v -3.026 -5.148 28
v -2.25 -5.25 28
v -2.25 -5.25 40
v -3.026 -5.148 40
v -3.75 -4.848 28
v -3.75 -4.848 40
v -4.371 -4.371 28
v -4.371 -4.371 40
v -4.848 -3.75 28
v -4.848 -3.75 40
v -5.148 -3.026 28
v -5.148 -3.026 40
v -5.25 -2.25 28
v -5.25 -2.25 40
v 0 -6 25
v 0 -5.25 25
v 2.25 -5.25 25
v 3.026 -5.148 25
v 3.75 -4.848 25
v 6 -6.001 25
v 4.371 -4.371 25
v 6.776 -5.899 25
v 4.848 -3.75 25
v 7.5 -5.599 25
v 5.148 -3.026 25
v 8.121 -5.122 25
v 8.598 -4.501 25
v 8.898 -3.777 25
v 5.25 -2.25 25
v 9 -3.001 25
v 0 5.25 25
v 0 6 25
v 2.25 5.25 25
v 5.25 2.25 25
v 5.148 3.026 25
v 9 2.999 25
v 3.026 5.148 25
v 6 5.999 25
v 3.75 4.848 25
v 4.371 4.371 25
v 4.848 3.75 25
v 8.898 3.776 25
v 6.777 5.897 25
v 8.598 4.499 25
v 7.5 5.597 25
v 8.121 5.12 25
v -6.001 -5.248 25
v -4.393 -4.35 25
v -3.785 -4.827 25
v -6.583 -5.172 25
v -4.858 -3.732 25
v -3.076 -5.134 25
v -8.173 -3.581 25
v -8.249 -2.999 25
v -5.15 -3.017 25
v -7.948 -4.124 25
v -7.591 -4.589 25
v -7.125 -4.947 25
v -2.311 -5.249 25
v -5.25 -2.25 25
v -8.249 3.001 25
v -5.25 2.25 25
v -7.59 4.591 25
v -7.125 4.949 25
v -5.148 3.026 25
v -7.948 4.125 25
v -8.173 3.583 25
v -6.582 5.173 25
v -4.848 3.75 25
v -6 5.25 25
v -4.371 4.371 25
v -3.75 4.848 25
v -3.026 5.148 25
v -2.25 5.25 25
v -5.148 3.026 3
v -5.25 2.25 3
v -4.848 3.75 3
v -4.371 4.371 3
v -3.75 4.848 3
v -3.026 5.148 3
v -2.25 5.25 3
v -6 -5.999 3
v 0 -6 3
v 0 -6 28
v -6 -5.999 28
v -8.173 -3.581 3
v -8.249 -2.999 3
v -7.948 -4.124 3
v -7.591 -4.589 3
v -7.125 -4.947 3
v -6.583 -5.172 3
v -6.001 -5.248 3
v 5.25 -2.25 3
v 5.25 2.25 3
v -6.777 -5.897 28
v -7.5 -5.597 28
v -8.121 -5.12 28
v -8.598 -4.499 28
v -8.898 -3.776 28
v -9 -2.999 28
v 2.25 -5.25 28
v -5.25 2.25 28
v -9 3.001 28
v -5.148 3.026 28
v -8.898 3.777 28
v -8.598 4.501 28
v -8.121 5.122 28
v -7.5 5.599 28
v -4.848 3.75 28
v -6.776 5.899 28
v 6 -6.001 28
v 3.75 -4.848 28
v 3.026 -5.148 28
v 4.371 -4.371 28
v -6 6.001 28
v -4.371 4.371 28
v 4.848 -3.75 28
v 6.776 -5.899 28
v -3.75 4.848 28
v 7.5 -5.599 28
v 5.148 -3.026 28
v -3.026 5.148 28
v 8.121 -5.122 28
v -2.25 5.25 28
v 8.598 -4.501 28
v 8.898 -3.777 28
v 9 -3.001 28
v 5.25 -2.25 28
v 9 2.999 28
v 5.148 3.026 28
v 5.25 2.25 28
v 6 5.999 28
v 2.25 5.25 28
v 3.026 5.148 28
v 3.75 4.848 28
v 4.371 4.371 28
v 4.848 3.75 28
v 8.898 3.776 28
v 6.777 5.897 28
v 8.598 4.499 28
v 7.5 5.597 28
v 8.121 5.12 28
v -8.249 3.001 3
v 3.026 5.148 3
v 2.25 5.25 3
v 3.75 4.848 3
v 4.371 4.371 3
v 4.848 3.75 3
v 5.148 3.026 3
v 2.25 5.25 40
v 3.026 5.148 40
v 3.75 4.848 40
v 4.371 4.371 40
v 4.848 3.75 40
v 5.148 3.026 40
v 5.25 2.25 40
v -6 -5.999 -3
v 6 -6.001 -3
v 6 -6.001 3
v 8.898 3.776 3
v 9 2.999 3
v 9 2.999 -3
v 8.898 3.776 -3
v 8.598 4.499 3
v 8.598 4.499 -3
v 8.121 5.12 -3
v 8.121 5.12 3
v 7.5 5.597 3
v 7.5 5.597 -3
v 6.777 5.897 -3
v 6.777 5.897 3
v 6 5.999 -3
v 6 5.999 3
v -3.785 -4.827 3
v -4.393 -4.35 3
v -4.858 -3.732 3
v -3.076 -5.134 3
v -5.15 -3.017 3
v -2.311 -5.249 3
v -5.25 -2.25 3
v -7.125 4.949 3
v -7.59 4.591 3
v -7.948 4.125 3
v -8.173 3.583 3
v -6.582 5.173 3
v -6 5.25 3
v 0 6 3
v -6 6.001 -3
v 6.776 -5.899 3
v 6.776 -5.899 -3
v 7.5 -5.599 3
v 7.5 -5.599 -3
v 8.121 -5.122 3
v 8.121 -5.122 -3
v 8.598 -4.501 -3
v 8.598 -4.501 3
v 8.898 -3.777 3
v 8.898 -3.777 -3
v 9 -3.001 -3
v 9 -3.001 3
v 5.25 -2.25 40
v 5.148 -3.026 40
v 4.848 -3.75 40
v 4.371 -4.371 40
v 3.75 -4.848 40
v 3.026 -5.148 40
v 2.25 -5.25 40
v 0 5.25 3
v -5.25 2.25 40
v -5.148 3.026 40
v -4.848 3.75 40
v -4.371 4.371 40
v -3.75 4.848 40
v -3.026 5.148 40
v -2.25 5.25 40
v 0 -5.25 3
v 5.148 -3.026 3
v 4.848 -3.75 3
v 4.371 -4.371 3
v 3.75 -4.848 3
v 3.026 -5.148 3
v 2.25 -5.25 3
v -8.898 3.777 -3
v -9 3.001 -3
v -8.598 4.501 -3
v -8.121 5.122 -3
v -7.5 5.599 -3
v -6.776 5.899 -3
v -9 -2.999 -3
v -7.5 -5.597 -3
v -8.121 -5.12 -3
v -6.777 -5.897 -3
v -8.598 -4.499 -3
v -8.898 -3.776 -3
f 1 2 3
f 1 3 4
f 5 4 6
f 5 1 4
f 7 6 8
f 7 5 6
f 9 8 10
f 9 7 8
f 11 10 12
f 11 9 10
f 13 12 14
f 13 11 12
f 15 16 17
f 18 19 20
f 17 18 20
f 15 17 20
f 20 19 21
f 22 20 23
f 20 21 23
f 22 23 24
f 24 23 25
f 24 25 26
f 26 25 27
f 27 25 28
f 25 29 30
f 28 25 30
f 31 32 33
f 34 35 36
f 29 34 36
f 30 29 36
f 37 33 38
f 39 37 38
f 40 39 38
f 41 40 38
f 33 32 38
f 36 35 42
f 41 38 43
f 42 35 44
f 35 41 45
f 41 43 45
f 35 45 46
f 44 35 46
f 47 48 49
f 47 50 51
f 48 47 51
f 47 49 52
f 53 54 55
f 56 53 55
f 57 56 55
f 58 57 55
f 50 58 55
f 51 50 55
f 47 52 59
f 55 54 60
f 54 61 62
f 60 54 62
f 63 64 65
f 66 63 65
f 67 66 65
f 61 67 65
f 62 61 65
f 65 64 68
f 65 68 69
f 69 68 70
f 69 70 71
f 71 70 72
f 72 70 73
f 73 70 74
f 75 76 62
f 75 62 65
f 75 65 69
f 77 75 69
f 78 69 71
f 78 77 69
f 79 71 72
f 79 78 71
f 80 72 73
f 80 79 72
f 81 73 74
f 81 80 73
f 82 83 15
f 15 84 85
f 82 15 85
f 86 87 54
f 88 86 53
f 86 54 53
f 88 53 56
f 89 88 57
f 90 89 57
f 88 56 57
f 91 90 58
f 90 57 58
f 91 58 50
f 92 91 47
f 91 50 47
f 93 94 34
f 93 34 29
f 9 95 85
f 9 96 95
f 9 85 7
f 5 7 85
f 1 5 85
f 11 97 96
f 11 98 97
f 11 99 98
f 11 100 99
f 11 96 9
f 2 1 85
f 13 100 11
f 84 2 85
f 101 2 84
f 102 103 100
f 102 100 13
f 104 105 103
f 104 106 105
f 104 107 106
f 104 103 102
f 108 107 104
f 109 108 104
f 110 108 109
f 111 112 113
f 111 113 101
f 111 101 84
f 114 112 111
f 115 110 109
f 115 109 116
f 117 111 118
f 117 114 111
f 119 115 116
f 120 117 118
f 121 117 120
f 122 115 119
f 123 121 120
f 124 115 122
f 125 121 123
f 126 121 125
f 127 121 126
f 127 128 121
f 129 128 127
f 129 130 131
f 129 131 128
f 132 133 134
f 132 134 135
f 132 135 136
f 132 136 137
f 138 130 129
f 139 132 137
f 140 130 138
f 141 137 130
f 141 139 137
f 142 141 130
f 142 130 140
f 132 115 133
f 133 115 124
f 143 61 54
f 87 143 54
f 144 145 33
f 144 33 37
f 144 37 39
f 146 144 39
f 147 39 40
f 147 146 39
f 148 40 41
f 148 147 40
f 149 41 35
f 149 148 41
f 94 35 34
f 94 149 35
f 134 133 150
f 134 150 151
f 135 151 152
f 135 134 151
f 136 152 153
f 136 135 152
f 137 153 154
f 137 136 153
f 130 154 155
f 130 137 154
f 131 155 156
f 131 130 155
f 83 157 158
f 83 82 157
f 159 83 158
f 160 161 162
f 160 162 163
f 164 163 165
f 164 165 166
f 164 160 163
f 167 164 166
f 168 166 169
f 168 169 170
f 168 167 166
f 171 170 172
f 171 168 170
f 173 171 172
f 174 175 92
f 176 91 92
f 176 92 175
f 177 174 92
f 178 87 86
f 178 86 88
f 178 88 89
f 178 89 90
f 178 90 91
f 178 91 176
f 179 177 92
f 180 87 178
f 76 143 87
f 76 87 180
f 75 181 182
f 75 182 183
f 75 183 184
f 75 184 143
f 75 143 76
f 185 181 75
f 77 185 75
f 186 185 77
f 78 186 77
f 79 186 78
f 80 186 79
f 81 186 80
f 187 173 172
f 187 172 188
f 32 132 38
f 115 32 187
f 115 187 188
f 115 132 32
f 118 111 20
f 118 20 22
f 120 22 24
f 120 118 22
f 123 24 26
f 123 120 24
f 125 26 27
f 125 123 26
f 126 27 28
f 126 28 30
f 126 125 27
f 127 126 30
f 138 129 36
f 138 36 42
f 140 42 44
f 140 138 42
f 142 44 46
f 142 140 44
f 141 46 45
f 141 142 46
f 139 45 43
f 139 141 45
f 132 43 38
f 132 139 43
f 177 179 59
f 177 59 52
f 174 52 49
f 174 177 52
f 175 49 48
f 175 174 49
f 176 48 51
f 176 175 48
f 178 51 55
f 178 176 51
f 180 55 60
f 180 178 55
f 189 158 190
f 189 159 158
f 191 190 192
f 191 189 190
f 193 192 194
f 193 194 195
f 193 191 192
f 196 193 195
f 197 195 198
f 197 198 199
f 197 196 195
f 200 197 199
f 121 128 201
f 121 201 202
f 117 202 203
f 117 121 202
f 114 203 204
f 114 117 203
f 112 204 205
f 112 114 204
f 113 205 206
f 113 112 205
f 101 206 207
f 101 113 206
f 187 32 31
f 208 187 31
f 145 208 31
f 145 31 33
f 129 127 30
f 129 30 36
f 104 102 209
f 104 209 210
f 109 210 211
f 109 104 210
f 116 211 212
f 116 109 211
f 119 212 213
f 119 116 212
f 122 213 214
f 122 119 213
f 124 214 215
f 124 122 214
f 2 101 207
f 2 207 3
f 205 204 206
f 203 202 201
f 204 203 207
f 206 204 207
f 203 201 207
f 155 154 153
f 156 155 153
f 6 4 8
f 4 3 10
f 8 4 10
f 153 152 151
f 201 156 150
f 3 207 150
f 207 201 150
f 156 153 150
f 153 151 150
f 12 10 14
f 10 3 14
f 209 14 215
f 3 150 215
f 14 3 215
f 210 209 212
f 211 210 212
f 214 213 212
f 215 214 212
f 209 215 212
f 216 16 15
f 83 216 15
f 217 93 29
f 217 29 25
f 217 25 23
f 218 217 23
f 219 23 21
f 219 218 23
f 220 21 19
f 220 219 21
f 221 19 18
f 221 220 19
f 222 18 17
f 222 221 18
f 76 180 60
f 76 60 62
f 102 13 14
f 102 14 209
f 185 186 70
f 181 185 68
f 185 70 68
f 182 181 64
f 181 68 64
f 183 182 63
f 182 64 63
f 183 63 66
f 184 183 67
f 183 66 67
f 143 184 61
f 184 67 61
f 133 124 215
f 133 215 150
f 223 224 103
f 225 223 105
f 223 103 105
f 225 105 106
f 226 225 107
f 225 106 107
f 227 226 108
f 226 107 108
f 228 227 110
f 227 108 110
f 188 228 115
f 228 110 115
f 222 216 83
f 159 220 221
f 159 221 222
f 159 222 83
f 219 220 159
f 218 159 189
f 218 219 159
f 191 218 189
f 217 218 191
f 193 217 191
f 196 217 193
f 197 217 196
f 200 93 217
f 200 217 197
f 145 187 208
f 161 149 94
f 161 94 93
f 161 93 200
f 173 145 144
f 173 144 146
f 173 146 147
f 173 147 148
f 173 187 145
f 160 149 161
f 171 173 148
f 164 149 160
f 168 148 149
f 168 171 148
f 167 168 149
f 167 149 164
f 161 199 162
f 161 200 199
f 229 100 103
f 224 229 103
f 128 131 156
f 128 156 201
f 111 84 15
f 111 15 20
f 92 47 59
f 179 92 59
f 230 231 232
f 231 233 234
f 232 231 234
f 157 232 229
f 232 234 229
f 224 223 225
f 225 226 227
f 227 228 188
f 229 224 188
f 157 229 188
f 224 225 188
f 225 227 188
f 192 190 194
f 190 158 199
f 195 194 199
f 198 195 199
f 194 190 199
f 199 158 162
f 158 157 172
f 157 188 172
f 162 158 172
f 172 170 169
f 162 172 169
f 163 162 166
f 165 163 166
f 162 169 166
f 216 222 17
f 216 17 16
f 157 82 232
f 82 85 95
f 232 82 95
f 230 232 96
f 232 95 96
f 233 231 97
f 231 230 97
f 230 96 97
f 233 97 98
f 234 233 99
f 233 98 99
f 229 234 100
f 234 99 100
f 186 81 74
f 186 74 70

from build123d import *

# Parameters (mm, degrees)
BOSS_EXTRUDE1_DEPTH = 40
BOSS_EXTRUDE2_DEPTH = 3
BOSS_EXTRUDE3_START = 25
BOSS_EXTRUDE3_DEPTH = 25
BOSS_EXTRUDE4_START = -12
BOSS_EXTRUDE4_DEPTH = 3


with BuildPart() as part:
    # Sketch1 → Boss-Extrude1 (new body)
    with BuildSketch(Plane.XY):
        with BuildLine():
            Line((-2.25, 5.25), (2.25, 5.25))
            ThreePointArc((2.25, 5.25), (4.371320344, 4.371320344), (5.25, 2.25))
            Line((5.25, 2.25), (5.25, -2.25))
            ThreePointArc((5.25, -2.25), (4.371320344, -4.371320344), (2.25, -5.25))
            Line((2.25, -5.25), (-2.25, -5.25))
            ThreePointArc((-2.25, -5.25), (-4.371320344, -4.371320344), (-5.25, -2.25))
            Line((-5.25, -2.25), (-5.25, 2.25))
            ThreePointArc((-5.25, 2.25), (-4.371320344, 4.371320344), (-2.25, 5.25))
        make_face()
    extrude(amount=BOSS_EXTRUDE1_DEPTH)

    # Sketch2 → Boss-Extrude2 (add, symmetric)
    with BuildSketch(Plane.XY):
        with BuildLine():
            Line((8.999999945, -3.000810302), (8.999999945, 2.999189698))
            ThreePointArc((8.999999945, 2.999189698), (8.121463527, 5.120366794), (6.000405096, 5.999189671))
            Line((6.000405096, 5.999189671), (-5.999594794, 6.000810275))
            ThreePointArc((-5.999594794, 6.000810275), (-8.121177041, 5.122273883), (-8.999999945, 3.000810302))
            Line((-8.999999945, 3.000810302), (-8.999999945, -2.999189698))
            ThreePointArc((-8.999999945, -2.999189698), (-8.121463527, -5.120366794), (-6.000405096, -5.999189671))
            Line((-6.000405096, -5.999189671), (5.999594794, -6.000810275))
            ThreePointArc((5.999594794, -6.000810275), (8.121177041, -5.122273883), (8.999999945, -3.000810302))
        make_face()
    extrude(amount=BOSS_EXTRUDE2_DEPTH, both=True)

    # Sketch3 → Boss-Extrude3 (add)
    with BuildSketch(Plane.XY.offset(3).offset(BOSS_EXTRUDE3_START)):
        with BuildLine():
            Line((0.000405151, 5.25), (-5.999999945, 5.25))
            ThreePointArc((-5.999999945, 5.25), (-7.590417233, 4.59122759), (-8.249189643, 3.000810302))
            Line((-8.249189643, 3.000810302), (-8.249189643, -2.999189698))
            ThreePointArc((-8.249189643, -2.999189698), (-7.590631979, -4.58939221), (-6.000607381, -5.248379314))
            Line((-6.000607381, -5.248379314), (0.000405151, -5.25))
            Line((0.000405151, -5.25), (0.000405151, -6.000000082))
            Line((0.000405151, -6.000000082), (-6.000405096, -5.999189671))
            ThreePointArc((-6.000405096, -5.999189671), (-8.121463527, -5.120366794), (-8.999999945, -2.999189698))
            Line((-8.999999945, -2.999189698), (-8.999999945, 3.000810302))
            ThreePointArc((-8.999999945, 3.000810302), (-8.121177041, 5.122273883), (-5.999594794, 6.000810275))
            Line((-5.999594794, 6.000810275), (0.000405151, 5.999999973))
            Line((0.000405151, 5.999999973), (0.000405151, 5.25))
        make_face()
    extrude(amount=-BOSS_EXTRUDE3_DEPTH)

    # Sketch5 → Boss-Extrude4 (add)
    with BuildSketch(Plane.XY.offset(40).offset(BOSS_EXTRUDE4_START)):
        with BuildLine():
            Line((0.000405151, -6.000000082), (5.999594794, -6.000810275))
            ThreePointArc((5.999594794, -6.000810275), (8.121177041, -5.122273883), (8.999999945, -3.000810302))
            Line((8.999999945, -3.000810302), (8.999999945, 2.999189698))
            ThreePointArc((8.999999945, 2.999189698), (8.121463527, 5.120366794), (6.000405096, 5.999189671))
            Line((6.000405096, 5.999189671), (0.000405151, 5.999999973))
            Line((0.000405151, 5.999999973), (-5.999594794, 6.000810275))
            ThreePointArc((-5.999594794, 6.000810275), (-8.121177041, 5.122273883), (-8.999999945, 3.000810302))
            Line((-8.999999945, 3.000810302), (-8.999999945, -2.999189698))
            ThreePointArc((-8.999999945, -2.999189698), (-8.121463527, -5.120366794), (-6.000405096, -5.999189671))
            Line((-6.000405096, -5.999189671), (0.000405151, -6.000000082))
        make_face()
    extrude(amount=-BOSS_EXTRUDE4_DEPTH)


solid = part.part
